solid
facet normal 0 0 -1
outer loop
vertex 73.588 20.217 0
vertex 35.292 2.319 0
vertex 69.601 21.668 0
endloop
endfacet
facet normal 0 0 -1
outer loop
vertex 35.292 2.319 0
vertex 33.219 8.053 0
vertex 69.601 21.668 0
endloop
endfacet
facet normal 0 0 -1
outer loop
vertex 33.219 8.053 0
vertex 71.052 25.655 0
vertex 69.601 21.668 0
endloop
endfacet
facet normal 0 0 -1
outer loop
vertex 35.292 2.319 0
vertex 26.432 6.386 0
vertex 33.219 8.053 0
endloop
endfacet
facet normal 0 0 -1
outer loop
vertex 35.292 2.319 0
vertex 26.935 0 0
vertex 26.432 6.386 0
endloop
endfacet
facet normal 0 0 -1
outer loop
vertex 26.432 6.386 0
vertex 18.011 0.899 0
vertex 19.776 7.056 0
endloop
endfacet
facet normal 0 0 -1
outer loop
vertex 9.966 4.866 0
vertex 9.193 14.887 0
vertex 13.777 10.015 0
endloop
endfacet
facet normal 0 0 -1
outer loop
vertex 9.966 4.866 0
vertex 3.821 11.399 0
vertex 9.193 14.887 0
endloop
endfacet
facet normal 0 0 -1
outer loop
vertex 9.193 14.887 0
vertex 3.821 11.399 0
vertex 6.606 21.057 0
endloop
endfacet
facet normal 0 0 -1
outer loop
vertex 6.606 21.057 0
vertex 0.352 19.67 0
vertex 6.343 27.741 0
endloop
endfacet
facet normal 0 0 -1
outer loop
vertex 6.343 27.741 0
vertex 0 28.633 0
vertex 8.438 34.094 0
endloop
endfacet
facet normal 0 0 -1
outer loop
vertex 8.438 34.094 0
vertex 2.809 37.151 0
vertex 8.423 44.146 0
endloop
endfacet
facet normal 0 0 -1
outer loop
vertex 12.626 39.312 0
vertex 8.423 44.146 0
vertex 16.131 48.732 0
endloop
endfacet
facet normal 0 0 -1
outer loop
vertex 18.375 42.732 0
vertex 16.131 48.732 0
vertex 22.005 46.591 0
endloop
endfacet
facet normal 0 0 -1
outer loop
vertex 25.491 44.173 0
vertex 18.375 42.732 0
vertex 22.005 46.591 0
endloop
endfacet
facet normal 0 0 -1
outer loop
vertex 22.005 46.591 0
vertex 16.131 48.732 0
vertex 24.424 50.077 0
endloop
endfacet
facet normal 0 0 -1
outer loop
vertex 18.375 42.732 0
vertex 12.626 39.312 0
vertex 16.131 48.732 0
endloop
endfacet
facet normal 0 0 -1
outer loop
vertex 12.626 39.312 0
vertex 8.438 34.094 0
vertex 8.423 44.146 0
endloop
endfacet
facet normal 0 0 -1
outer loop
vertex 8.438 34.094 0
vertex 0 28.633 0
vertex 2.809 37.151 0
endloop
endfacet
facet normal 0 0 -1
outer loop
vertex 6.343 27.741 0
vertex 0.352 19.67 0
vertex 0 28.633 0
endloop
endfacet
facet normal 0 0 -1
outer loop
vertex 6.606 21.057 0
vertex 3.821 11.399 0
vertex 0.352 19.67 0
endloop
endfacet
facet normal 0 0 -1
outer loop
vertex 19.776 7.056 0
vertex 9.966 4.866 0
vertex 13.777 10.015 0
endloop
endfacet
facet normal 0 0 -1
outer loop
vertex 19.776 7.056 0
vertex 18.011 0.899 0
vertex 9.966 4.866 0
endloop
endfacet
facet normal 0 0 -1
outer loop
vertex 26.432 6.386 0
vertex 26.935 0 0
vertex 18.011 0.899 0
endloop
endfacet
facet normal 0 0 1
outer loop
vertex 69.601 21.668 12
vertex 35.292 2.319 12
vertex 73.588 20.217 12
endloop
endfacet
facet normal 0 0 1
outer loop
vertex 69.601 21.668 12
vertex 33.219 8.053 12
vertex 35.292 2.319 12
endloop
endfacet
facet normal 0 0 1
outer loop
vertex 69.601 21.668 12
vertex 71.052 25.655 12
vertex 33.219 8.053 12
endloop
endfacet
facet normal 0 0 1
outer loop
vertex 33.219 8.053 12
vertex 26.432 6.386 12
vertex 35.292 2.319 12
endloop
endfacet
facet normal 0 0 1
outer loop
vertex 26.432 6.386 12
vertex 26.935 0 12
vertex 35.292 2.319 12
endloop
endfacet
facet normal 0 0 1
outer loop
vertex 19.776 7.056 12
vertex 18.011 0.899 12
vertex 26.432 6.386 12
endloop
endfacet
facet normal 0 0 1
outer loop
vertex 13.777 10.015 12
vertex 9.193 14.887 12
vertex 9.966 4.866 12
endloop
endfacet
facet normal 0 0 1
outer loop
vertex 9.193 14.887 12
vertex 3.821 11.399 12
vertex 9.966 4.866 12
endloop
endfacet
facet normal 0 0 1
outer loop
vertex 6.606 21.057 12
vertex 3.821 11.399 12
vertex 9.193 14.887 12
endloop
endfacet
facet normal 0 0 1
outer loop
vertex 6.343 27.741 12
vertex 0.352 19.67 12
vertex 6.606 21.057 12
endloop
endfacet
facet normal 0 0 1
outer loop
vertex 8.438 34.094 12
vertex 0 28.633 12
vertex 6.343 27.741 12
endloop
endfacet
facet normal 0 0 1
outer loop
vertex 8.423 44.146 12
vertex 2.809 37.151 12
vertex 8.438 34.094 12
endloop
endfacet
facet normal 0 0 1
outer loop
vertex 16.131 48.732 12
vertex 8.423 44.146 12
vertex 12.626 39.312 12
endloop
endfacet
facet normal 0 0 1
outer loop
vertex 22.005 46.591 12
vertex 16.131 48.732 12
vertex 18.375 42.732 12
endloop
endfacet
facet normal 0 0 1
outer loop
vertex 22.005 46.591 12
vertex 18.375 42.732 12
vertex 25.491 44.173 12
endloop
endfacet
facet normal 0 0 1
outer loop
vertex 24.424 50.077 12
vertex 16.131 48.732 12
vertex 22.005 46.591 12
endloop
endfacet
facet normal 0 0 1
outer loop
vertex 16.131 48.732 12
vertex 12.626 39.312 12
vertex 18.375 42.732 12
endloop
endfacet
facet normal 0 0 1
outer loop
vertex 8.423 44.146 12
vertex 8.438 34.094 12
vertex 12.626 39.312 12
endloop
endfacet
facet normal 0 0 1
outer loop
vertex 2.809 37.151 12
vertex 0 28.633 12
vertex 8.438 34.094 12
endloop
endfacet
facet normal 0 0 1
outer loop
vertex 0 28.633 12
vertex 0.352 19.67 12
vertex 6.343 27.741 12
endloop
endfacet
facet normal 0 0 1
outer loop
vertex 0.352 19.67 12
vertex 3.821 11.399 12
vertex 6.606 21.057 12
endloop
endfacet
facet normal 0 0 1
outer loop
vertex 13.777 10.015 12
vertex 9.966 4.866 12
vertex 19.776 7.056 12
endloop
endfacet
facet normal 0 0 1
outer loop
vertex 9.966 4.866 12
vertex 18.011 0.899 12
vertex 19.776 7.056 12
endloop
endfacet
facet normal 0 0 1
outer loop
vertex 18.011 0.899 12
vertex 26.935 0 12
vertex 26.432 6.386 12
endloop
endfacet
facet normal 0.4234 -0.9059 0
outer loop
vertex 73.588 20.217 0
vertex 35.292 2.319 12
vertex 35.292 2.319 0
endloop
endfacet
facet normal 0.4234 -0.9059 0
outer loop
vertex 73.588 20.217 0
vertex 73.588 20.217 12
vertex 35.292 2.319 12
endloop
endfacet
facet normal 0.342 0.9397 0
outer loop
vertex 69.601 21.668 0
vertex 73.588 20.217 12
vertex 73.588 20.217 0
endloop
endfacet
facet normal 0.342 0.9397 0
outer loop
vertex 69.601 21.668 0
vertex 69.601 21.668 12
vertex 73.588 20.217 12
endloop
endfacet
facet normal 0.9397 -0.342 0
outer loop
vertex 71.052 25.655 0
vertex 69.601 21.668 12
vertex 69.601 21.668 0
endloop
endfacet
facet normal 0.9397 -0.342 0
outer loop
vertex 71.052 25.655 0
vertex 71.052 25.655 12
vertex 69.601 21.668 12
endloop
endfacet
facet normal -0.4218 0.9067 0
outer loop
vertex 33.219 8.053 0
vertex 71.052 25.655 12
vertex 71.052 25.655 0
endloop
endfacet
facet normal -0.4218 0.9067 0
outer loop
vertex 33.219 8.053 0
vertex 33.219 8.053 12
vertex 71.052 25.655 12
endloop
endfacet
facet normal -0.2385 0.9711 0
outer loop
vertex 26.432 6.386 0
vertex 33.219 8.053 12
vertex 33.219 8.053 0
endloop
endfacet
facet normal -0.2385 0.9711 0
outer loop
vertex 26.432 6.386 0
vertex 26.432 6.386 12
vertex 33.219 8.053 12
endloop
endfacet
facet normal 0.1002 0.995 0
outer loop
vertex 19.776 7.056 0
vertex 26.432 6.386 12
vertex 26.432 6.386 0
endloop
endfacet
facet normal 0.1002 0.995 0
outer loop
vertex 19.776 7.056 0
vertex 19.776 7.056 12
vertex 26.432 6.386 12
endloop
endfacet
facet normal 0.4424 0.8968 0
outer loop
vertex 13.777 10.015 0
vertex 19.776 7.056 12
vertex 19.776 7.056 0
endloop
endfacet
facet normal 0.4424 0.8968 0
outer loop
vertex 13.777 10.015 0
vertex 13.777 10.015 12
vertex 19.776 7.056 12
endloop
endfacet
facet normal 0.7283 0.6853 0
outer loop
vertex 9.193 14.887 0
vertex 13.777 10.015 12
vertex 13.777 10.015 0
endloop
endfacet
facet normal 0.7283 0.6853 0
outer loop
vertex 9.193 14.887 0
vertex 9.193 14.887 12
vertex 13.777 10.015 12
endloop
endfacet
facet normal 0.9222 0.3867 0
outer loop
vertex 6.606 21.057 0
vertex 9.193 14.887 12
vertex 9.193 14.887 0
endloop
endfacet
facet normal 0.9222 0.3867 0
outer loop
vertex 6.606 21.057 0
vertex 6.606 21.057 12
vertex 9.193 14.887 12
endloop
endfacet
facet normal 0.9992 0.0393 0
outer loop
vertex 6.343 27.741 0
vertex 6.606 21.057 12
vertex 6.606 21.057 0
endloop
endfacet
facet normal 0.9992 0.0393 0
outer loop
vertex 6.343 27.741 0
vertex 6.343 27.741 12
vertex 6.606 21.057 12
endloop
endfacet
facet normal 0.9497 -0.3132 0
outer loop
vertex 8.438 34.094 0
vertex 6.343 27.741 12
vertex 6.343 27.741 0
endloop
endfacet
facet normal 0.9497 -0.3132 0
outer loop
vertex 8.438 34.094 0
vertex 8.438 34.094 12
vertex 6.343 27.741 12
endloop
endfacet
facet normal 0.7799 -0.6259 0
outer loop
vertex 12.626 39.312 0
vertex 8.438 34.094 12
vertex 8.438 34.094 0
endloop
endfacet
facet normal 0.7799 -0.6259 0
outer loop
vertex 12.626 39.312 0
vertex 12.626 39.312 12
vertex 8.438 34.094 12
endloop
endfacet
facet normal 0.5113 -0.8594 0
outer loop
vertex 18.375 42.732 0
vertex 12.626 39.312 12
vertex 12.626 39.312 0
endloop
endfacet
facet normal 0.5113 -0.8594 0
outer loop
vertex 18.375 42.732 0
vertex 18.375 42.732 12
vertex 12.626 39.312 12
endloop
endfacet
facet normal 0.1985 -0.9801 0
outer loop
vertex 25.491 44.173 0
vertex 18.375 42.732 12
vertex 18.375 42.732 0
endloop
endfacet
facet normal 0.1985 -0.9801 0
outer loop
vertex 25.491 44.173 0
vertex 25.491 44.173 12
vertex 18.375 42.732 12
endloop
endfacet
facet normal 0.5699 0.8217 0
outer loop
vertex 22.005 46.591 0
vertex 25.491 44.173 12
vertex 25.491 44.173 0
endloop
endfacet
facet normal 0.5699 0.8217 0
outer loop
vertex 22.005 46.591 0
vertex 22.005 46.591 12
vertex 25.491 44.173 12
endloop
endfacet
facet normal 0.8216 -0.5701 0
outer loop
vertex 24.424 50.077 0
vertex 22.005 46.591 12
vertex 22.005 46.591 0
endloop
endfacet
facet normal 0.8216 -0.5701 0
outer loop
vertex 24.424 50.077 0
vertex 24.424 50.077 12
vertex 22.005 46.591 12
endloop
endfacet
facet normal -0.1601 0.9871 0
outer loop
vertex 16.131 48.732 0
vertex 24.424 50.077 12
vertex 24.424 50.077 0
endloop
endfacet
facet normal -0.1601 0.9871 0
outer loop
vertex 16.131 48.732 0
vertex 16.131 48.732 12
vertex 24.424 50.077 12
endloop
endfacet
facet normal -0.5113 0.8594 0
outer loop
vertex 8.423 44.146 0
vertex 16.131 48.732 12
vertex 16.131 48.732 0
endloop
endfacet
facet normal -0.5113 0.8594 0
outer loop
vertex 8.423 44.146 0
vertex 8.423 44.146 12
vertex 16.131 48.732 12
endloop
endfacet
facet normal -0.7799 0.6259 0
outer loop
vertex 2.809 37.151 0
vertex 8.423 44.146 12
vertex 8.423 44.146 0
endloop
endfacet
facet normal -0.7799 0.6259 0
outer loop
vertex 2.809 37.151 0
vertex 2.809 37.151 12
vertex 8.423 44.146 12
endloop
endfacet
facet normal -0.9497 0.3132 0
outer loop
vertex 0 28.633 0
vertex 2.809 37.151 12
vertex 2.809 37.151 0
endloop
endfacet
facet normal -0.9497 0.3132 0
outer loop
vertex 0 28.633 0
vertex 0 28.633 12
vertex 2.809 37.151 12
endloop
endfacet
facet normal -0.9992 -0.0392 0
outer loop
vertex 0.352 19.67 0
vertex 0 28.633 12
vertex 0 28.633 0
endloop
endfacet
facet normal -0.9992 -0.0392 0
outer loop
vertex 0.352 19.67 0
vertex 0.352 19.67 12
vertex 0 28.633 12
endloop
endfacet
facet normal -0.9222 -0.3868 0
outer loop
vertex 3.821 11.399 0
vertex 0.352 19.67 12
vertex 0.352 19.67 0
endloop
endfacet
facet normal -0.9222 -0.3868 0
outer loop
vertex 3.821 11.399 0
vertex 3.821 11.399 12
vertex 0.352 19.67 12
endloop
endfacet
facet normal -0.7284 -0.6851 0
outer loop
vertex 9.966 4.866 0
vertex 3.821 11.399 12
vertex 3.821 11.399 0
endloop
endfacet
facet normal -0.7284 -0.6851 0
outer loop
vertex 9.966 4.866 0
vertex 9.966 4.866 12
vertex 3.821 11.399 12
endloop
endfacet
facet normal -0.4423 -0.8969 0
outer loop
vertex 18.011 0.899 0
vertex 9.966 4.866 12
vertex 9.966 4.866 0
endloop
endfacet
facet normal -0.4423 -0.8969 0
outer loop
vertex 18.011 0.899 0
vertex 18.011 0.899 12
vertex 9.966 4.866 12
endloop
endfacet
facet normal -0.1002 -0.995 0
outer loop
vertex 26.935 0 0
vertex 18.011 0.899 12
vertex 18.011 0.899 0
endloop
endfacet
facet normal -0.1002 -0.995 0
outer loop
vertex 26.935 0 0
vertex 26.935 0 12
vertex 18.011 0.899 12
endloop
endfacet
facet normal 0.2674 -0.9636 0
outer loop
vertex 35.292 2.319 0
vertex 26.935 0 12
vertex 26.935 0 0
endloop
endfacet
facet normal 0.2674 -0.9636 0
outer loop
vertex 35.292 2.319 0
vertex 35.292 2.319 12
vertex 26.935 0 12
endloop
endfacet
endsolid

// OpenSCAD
$fn = 32;

// ----------------------------------------------------------------------
// Hook plate: curl radius 22 mm over 205 degrees, 6 mm thick band
// ----------------------------------------------------------------------

// --- parameters (mm) ---
profile_height = 12;      // extrusion height
profile_points = 26;      // points of the closed outline

profile = [[22.005, 46.591], [24.424, 50.077], [16.131, 48.732], [8.423, 44.146], [2.809, 37.151], [0, 28.633], [0.352, 19.67], [3.821, 11.399], [9.966, 4.866], [18.011, 0.899], [26.935, 0], [35.292, 2.319], [73.588, 20.217], [69.601, 21.668], [71.052, 25.655], [33.219, 8.053], [26.432, 6.386], [19.776, 7.056], [13.777, 10.015], [9.193, 14.887], [6.606, 21.057], [6.343, 27.741], [8.438, 34.094], [12.626, 39.312], [18.375, 42.732], [25.491, 44.173]];  // single closed polygon, 26 points, counter clockwise

// --- the one profile operation ---
linear_extrude(height = profile_height) polygon(points = profile);
